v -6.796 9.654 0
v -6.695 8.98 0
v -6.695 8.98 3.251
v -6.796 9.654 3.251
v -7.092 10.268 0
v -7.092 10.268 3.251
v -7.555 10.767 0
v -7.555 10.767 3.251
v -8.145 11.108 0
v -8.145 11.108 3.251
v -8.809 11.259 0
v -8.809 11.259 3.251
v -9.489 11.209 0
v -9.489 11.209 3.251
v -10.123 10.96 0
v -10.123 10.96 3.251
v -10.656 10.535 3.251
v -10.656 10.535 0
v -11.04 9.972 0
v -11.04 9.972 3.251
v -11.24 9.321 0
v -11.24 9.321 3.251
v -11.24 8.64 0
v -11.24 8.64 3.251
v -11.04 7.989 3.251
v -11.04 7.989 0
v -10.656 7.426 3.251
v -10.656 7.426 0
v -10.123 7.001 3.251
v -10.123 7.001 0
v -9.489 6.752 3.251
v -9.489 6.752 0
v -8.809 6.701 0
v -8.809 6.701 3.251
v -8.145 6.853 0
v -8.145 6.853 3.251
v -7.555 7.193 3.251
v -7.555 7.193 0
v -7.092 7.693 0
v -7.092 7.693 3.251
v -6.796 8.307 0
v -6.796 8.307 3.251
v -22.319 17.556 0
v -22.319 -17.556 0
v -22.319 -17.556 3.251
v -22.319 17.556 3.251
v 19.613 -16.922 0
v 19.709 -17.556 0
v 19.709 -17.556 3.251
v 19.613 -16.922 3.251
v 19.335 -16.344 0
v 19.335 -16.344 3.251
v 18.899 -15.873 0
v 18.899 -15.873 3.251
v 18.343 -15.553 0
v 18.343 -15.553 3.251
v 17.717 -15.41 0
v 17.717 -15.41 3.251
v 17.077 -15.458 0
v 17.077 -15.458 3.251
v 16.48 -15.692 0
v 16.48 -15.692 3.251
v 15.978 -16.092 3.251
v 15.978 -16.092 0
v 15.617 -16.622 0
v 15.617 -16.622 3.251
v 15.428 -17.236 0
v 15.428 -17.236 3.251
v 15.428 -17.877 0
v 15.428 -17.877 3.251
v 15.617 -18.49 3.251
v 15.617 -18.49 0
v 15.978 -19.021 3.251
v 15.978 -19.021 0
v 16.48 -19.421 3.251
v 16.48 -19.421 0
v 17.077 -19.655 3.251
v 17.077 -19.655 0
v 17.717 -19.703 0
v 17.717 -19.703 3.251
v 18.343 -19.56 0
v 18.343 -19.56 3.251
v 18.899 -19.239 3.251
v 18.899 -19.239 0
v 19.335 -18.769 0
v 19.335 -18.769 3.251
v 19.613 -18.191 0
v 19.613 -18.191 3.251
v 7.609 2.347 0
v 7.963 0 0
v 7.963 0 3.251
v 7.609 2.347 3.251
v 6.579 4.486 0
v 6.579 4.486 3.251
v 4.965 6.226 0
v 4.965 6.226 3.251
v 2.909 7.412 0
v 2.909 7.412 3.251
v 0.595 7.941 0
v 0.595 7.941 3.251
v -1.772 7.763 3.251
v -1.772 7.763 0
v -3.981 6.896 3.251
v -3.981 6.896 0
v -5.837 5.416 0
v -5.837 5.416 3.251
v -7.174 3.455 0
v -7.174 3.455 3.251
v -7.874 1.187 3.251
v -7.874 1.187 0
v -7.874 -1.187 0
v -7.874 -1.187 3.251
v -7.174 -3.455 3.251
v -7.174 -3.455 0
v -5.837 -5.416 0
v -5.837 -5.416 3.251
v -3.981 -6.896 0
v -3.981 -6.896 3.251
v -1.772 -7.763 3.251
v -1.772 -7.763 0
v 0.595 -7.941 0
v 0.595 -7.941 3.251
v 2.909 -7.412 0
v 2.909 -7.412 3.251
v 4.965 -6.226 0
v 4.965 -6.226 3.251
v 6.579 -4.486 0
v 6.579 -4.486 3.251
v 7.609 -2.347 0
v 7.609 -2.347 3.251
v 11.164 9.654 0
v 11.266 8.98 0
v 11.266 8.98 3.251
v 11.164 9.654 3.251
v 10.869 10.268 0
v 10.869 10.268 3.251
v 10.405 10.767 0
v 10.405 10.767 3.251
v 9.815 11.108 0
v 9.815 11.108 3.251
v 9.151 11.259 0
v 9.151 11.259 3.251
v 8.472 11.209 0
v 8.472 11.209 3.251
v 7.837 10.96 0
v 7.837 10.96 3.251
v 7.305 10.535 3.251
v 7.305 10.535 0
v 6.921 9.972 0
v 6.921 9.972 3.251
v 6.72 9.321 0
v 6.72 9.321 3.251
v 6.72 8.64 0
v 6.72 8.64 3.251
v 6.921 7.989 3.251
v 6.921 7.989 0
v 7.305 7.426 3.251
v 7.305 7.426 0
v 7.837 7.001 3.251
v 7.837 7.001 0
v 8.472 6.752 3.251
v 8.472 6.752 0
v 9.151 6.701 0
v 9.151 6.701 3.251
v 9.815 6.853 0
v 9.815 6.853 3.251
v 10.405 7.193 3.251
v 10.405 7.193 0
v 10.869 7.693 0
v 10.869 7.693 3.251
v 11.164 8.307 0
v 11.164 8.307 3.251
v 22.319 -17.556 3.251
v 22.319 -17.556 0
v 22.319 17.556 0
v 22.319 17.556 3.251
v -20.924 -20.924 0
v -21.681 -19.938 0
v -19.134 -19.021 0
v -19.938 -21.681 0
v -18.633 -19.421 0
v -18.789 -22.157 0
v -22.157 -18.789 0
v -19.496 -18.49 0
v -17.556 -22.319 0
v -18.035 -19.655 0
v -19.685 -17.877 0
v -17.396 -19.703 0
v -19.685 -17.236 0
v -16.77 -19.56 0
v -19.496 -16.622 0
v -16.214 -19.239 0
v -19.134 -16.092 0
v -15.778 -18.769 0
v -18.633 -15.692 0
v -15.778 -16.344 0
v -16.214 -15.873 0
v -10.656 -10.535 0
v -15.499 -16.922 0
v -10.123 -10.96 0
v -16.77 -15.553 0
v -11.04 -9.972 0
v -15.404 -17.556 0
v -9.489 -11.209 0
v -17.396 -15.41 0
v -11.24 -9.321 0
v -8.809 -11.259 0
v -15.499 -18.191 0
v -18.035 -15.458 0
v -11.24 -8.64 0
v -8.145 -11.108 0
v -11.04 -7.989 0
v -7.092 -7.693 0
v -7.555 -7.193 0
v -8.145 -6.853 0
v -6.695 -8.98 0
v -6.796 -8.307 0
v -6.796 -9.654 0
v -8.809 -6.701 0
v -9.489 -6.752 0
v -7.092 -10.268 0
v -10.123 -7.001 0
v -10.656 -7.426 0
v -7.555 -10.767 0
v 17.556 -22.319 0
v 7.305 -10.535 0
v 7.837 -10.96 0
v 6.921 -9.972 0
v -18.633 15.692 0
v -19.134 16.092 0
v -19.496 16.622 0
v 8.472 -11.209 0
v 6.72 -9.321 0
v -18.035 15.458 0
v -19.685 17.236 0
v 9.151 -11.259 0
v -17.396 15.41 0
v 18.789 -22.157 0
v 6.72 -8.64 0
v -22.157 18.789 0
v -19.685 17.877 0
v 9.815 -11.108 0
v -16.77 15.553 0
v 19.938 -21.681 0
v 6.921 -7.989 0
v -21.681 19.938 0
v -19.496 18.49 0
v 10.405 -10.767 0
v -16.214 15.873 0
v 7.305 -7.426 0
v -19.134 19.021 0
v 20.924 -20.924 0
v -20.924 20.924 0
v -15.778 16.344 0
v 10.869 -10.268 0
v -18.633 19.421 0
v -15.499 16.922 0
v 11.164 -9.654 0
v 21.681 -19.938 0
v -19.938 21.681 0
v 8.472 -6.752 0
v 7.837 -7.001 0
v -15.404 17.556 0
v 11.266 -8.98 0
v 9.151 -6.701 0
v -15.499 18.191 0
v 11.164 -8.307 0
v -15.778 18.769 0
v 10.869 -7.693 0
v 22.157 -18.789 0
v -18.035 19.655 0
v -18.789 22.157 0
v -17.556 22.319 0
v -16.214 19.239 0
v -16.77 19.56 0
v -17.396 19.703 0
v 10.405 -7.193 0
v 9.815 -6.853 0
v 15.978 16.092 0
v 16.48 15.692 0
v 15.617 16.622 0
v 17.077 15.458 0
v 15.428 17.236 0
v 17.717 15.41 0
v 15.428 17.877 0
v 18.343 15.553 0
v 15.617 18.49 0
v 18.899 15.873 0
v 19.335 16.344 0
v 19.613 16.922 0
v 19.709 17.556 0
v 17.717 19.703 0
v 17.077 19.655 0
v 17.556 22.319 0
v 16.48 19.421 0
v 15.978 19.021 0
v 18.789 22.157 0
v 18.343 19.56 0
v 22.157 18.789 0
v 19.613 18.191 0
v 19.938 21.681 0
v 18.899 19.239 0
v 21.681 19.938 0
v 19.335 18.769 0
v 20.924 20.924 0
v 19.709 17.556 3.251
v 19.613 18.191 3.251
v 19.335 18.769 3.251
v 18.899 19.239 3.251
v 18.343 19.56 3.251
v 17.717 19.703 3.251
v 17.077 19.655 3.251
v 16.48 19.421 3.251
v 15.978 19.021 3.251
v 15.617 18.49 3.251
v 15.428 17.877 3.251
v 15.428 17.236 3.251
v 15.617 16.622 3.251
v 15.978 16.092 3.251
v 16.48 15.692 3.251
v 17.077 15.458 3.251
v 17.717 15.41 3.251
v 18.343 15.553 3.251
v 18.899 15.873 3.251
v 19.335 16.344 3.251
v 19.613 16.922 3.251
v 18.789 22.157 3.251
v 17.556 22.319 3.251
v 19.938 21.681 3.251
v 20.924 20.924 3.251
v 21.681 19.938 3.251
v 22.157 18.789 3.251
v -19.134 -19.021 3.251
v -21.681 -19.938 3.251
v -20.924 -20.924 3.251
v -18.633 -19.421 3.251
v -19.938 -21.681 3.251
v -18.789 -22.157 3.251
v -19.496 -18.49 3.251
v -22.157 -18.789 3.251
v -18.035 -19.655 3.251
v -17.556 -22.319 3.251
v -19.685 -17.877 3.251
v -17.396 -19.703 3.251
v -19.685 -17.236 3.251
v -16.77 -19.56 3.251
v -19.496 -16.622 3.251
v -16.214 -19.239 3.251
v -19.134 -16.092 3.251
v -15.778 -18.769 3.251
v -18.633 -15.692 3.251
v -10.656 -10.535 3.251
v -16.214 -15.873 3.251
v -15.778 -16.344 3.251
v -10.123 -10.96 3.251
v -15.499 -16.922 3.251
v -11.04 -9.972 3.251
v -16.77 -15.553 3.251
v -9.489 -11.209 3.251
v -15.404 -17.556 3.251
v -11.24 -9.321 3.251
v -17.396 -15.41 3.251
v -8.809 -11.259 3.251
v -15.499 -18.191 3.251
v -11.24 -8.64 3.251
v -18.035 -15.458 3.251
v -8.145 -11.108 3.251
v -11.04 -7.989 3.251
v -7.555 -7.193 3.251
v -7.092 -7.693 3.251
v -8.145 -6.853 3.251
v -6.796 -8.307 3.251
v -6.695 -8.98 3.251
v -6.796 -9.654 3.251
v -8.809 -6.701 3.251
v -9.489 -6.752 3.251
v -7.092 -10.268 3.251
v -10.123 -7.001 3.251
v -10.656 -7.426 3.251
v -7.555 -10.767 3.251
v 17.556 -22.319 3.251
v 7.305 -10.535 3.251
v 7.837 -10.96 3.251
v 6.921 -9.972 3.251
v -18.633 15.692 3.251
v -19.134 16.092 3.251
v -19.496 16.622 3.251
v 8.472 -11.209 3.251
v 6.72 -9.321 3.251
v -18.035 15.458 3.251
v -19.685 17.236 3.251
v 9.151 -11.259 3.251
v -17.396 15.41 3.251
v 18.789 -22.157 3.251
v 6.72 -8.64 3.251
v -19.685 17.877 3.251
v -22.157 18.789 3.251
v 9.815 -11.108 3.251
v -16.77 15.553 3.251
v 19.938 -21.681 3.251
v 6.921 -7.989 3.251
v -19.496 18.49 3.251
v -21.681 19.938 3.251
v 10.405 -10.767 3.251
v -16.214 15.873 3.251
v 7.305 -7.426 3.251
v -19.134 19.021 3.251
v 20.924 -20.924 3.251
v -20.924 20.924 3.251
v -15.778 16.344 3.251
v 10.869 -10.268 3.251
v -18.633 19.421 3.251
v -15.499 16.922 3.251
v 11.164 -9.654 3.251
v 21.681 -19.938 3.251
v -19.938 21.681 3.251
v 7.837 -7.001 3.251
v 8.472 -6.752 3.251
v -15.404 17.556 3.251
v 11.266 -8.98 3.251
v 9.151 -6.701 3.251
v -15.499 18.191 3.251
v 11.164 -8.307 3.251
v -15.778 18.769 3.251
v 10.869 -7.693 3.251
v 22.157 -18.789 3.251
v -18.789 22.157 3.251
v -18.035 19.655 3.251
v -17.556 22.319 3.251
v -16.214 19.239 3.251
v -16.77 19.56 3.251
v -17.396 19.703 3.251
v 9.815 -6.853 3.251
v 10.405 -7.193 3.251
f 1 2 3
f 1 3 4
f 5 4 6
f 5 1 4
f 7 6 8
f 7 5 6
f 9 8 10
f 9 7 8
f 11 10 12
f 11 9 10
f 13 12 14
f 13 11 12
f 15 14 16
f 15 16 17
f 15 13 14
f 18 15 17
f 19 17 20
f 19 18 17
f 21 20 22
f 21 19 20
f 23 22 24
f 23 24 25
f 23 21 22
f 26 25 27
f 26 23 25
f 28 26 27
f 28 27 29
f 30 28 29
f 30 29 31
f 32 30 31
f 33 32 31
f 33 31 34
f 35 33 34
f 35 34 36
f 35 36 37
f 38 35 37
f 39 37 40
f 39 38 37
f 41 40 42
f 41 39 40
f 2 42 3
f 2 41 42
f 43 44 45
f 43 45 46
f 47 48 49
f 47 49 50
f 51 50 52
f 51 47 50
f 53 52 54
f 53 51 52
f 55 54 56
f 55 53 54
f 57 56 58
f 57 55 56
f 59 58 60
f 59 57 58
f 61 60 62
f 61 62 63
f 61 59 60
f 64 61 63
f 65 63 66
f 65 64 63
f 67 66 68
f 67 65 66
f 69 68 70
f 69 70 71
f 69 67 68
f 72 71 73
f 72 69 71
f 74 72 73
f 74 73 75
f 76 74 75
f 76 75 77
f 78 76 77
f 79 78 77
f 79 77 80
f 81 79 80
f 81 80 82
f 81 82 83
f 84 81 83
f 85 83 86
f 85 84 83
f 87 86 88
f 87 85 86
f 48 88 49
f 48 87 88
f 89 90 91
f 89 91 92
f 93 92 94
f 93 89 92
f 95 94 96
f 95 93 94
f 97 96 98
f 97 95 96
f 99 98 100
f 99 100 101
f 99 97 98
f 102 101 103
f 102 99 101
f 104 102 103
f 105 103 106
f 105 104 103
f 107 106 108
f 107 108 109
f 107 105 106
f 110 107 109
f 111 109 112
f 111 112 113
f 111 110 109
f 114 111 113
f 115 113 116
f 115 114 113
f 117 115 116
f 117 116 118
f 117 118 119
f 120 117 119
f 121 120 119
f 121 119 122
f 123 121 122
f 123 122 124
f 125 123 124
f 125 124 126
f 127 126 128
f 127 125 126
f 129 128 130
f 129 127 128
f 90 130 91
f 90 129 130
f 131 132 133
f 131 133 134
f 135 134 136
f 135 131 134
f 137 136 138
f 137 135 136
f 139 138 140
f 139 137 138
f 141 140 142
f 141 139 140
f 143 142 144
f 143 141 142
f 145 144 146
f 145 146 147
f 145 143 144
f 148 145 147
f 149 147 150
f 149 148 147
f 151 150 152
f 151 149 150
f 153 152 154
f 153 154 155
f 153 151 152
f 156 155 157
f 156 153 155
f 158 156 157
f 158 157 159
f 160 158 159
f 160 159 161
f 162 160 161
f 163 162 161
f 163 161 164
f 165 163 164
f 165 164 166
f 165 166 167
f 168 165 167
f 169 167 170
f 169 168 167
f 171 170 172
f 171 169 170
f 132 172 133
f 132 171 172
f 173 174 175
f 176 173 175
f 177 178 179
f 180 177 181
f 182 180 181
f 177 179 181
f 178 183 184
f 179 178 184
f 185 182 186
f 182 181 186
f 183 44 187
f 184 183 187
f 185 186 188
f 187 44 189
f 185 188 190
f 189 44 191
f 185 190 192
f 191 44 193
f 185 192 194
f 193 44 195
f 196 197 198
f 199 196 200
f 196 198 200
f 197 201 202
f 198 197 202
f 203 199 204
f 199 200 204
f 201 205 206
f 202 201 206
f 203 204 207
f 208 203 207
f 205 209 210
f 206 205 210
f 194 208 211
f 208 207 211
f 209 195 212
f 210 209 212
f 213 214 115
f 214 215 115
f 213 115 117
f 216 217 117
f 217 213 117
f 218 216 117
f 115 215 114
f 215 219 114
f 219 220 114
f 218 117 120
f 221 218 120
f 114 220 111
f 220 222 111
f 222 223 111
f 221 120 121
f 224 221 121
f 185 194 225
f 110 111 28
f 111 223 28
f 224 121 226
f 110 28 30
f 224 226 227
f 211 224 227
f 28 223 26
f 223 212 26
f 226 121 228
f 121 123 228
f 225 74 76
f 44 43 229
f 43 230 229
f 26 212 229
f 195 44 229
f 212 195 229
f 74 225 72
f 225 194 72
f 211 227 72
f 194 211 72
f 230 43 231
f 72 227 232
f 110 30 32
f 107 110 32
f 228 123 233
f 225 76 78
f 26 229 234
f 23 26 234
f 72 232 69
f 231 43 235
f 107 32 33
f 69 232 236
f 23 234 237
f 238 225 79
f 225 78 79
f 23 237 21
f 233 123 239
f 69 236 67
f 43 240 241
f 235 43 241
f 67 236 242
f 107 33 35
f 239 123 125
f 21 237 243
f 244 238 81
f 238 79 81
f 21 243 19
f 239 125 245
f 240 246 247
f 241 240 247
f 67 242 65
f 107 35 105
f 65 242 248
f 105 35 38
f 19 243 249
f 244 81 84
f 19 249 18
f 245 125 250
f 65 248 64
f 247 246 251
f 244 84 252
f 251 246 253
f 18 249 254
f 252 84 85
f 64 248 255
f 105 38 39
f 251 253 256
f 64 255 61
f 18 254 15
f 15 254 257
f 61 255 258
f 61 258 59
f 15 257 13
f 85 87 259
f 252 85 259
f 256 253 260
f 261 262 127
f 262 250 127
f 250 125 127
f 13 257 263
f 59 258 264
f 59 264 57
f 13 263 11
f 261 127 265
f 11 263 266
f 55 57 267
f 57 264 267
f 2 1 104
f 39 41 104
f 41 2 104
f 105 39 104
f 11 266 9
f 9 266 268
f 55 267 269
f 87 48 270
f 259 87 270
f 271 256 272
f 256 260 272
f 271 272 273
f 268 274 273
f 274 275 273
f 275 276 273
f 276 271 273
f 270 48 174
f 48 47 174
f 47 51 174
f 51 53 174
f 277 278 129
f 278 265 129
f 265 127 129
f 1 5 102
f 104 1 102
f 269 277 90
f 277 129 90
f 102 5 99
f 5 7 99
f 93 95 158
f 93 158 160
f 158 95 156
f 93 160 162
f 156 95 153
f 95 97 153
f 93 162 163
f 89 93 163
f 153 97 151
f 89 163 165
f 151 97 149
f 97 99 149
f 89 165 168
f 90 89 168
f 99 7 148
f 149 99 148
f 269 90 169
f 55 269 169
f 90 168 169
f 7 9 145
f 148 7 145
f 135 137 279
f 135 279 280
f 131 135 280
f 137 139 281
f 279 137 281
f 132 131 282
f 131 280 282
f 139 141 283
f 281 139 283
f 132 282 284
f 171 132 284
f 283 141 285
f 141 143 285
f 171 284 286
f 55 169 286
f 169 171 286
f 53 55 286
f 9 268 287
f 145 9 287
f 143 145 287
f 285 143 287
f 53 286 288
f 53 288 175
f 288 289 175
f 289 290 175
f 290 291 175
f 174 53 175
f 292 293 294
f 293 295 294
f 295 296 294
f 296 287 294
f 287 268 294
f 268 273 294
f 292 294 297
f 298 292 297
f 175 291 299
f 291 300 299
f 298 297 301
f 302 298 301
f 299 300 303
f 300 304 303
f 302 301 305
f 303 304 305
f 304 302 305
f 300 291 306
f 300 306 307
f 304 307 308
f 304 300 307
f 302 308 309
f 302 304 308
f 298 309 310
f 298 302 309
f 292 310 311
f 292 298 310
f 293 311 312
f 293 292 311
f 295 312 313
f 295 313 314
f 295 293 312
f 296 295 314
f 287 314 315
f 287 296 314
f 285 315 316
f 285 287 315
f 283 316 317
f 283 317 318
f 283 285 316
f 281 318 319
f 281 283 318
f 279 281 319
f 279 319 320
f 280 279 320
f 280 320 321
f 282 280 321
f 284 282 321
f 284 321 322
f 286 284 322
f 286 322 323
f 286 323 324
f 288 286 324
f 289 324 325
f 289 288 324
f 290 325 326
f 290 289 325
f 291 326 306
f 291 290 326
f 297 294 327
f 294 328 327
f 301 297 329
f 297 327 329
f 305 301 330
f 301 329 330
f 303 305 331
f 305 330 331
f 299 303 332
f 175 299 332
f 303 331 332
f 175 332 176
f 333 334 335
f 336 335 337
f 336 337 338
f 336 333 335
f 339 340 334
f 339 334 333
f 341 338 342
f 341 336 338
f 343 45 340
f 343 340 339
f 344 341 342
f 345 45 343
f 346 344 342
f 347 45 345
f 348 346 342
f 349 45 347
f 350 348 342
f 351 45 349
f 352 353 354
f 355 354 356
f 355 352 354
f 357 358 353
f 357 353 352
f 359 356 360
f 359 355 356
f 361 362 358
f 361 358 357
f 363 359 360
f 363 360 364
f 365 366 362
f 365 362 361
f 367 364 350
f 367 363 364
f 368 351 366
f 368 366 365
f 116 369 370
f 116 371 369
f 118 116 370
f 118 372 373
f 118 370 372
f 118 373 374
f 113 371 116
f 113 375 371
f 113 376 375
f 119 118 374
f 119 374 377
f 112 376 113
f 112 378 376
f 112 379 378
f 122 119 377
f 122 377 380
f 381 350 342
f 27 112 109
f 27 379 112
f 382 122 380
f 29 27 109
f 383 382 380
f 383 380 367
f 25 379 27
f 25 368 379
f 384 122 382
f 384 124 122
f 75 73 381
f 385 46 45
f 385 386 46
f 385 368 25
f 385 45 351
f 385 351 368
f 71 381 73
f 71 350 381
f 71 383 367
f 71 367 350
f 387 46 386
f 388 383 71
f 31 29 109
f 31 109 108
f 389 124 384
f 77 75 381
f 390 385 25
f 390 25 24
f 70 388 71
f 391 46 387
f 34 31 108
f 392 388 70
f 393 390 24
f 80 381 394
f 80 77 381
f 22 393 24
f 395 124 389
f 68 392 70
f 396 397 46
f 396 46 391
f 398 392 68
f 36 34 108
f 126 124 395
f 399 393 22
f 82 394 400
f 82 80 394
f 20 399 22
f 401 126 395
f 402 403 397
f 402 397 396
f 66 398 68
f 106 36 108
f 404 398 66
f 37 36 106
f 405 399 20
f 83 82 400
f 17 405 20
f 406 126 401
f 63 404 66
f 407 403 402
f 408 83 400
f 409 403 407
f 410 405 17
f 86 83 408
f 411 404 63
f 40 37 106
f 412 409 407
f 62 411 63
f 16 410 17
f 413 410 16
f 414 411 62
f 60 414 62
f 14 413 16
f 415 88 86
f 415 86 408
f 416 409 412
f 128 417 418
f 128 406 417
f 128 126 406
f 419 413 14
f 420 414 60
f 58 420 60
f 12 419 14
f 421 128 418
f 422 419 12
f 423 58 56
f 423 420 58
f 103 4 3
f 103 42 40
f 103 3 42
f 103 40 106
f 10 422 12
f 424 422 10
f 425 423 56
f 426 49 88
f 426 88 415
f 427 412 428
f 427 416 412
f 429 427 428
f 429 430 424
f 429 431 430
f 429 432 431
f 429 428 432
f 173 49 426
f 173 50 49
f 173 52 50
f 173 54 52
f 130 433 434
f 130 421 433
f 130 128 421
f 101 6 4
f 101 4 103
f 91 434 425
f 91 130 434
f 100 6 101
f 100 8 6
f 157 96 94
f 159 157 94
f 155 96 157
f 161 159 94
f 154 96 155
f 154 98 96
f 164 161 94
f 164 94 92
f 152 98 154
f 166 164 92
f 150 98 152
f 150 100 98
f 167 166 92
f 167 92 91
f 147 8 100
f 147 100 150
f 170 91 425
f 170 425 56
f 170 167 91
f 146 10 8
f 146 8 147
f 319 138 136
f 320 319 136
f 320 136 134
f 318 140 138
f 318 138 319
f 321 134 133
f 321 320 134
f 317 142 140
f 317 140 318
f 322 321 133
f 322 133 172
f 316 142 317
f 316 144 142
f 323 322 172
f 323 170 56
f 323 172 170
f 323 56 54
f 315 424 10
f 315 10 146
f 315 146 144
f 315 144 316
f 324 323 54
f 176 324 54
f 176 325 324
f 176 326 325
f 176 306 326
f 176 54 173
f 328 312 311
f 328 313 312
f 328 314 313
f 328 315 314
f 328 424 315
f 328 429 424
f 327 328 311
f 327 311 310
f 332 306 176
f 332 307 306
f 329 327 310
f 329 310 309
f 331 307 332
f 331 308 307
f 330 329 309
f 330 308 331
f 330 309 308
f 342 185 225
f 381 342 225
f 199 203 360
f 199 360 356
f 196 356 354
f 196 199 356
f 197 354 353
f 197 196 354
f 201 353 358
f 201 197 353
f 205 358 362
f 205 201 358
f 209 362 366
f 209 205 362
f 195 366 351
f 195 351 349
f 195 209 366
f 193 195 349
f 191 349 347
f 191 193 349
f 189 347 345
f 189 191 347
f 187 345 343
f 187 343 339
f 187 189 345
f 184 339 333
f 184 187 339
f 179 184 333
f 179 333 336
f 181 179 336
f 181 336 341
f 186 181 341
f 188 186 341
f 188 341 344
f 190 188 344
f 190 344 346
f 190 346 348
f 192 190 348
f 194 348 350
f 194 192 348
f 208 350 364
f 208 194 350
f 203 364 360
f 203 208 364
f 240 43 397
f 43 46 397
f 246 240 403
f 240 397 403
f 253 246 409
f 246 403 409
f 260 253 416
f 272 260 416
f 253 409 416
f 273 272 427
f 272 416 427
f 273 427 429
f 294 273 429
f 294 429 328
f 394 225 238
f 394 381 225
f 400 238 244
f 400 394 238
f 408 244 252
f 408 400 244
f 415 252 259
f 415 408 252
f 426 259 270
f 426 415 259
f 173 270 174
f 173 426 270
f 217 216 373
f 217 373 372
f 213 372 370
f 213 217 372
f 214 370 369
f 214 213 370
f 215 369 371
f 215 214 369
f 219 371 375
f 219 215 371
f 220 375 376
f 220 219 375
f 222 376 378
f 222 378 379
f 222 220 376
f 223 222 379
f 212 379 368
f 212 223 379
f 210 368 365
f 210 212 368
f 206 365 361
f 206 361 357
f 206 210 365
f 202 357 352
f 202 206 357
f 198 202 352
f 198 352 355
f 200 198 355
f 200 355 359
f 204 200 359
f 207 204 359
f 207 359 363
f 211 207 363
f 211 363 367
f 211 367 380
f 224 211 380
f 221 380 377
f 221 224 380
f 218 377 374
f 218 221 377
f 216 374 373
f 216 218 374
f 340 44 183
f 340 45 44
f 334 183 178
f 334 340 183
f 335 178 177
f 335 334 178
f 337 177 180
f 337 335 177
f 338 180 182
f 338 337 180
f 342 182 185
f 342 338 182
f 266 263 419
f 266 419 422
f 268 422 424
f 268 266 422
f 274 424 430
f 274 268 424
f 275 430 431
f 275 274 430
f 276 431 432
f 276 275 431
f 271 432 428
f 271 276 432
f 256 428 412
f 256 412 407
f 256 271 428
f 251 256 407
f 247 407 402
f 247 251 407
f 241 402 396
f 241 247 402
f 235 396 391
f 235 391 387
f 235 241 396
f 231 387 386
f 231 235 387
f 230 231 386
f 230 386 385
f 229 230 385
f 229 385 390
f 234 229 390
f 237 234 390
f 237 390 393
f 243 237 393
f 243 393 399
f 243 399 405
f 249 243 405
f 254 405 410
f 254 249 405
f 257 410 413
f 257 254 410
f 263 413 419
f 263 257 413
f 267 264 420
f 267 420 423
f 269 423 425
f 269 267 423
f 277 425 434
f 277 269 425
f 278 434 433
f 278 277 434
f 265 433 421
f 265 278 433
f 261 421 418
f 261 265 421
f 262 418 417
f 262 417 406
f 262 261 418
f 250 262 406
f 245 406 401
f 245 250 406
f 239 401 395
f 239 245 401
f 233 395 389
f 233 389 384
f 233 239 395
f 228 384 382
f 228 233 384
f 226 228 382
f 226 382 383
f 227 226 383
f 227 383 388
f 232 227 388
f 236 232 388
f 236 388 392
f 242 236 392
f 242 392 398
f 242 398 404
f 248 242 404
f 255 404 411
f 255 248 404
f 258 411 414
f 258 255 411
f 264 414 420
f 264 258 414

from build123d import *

# Parameters (mm, degrees)
F0_W     = 44.637802
F0_H     = 44.637802
F0_R     = 2.15265
F0_R_2   = 2.285606
F0_R_3   = 7.9629
F1_DEPTH = 3.2512
F2_R     = 4.7625


with BuildPart() as f1:
    # F0 (on Top) → F1 (new body)
    with BuildSketch(Plane.XY):
        Rectangle(F0_W, F0_H)
        with Locations((-17.556401, -17.556401)):
            Circle(F0_R, mode=Mode.SUBTRACT)
        with Locations((-8.980259, -8.980259)):
            Circle(F0_R_2, mode=Mode.SUBTRACT)
        with Locations((17.556401, -17.556401)):
            Circle(F0_R, mode=Mode.SUBTRACT)
        with Locations((8.980259, -8.980259)):
            Circle(F0_R_2, mode=Mode.SUBTRACT)
        Circle(F0_R_3, mode=Mode.SUBTRACT)
        with Locations((-8.980259, 8.980259)):
            Circle(F0_R_2, mode=Mode.SUBTRACT)
        with Locations((-17.556401, 17.556401)):
            Circle(F0_R, mode=Mode.SUBTRACT)
        with Locations((8.980259, 8.980259)):
            Circle(F0_R_2, mode=Mode.SUBTRACT)
        with Locations((17.556401, 17.556401)):
            Circle(F0_R, mode=Mode.SUBTRACT)
    extrude(amount=F1_DEPTH)

    # F2
    f2_edges = [f1.edges().sort_by_distance(p)[0] for p in [
        (-22.318901, -22.318901, 1.6256),
        (22.318901, -22.318901, 1.6256),
        (22.318901, 22.318901, 1.6256),
        (-22.318901, 22.318901, 1.6256),
    ]]
    fillet(f2_edges, radius=F2_R)


solid = f1.part
